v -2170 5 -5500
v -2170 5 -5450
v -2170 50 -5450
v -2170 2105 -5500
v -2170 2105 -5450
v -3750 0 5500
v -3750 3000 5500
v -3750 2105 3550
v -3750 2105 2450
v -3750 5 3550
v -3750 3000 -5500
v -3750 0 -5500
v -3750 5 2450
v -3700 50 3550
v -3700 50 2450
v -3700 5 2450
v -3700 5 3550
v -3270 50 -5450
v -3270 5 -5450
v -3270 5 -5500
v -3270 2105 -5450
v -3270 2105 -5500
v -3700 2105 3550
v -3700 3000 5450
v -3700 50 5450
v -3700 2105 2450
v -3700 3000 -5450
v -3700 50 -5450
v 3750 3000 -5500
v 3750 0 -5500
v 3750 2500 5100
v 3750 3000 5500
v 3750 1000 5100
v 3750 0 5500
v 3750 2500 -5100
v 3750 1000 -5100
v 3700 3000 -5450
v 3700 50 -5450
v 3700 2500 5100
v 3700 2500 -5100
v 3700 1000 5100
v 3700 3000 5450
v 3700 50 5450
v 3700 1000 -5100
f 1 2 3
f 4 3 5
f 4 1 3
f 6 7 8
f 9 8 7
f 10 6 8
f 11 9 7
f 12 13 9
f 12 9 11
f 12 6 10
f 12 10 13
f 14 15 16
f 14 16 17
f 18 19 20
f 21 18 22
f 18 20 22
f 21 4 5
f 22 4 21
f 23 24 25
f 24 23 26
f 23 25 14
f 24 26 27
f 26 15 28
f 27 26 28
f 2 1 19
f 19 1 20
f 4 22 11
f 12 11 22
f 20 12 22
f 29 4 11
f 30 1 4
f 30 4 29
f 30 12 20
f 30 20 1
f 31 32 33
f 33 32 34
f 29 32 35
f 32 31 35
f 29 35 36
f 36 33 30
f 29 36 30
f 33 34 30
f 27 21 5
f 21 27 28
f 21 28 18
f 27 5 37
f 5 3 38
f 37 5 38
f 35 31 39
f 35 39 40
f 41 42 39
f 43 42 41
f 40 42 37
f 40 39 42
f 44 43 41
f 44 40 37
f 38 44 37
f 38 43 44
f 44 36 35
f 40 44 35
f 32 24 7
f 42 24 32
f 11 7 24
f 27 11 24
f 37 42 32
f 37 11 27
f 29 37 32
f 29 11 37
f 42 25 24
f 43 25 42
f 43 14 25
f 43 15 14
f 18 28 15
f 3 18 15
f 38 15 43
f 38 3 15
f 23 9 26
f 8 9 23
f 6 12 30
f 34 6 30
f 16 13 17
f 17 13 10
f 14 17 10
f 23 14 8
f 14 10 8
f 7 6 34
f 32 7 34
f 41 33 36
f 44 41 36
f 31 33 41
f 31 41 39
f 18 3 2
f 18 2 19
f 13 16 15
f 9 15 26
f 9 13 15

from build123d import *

# Parameters (mm, degrees)
SKETCH3_W           = 7500
SKETCH3_H           = 11000
BOSS_EXTRUDE1_DEPTH = 3000
SHELL1_T            = -50
CUT_EXTRUDE1_REACH  = 9774.41
SKETCH4_W           = 5100
SKETCH4_H           = 1500
SKETCH5_W           = 1100
SKETCH5_H           = 2100
CUT_EXTRUDE2_DEPTH  = 50
SKETCH6_W           = 1100
SKETCH6_H           = 2100
CUT_EXTRUDE3_DEPTH  = 50


with BuildPart() as part:
    # Sketch3 → Boss-Extrude1 (new body)
    with BuildSketch(Plane(origin=(0, 0, 0), x_dir=(1, 0, 0), z_dir=(0, 1, 0))):
        Rectangle(SKETCH3_W, SKETCH3_H)
    extrude(amount=BOSS_EXTRUDE1_DEPTH)

    # Shell1
    shell1_openings = [part.faces().sort_by_distance(p)[0] for p in [
        (0, 3000, 0),
    ]]
    offset(amount=SHELL1_T, openings=shell1_openings, kind=Kind.INTERSECTION)

    # Sketch4 → Cut-Extrude1 (cut, up to next)
    with BuildSketch(Plane(origin=(3750, 0, 0), x_dir=(0, 0, -1), z_dir=(1, 0, 0)), mode=Mode.PRIVATE) as cut_extrude1_sk1:
        with Locations((-2550, 1750)):
            Rectangle(SKETCH4_W, SKETCH4_H)
    cut_extrude1_tool1 = extrude(cut_extrude1_sk1.sketch, amount=-CUT_EXTRUDE1_REACH, mode=Mode.PRIVATE) & part.part
    # Sketch4 → Cut-Extrude1 (cut, up to next)
    with BuildSketch(Plane(origin=(3750, 0, 0), x_dir=(0, 0, -1), z_dir=(1, 0, 0)), mode=Mode.PRIVATE) as cut_extrude1_sk2:
        with Locations((2550, 1750)):
            Rectangle(SKETCH4_W, SKETCH4_H)
    cut_extrude1_tool2 = extrude(cut_extrude1_sk2.sketch, amount=-CUT_EXTRUDE1_REACH, mode=Mode.PRIVATE) & part.part
    add(cut_extrude1_tool1.solids().sort_by_distance((3750, 1750, 2550))[0], mode=Mode.SUBTRACT)
    add(cut_extrude1_tool2.solids().sort_by_distance((3750, 1750, -2550))[0], mode=Mode.SUBTRACT)

    # Sketch5 → Cut-Extrude2 (cut)
    with BuildSketch(Plane(origin=(0, 0, -5500), x_dir=(-1, 0, 0), z_dir=(0, 0, -1))):
        with Locations((2720, 1055)):
            Rectangle(SKETCH5_W, SKETCH5_H)
    extrude(amount=-CUT_EXTRUDE2_DEPTH, mode=Mode.SUBTRACT)

    # Sketch6 → Cut-Extrude3 (cut)
    with BuildSketch(Plane.ZY.offset(3750)):
        with Locations((3000, 1055)):
            Rectangle(SKETCH6_W, SKETCH6_H)
    extrude(amount=-CUT_EXTRUDE3_DEPTH, mode=Mode.SUBTRACT)


solid = part.part
